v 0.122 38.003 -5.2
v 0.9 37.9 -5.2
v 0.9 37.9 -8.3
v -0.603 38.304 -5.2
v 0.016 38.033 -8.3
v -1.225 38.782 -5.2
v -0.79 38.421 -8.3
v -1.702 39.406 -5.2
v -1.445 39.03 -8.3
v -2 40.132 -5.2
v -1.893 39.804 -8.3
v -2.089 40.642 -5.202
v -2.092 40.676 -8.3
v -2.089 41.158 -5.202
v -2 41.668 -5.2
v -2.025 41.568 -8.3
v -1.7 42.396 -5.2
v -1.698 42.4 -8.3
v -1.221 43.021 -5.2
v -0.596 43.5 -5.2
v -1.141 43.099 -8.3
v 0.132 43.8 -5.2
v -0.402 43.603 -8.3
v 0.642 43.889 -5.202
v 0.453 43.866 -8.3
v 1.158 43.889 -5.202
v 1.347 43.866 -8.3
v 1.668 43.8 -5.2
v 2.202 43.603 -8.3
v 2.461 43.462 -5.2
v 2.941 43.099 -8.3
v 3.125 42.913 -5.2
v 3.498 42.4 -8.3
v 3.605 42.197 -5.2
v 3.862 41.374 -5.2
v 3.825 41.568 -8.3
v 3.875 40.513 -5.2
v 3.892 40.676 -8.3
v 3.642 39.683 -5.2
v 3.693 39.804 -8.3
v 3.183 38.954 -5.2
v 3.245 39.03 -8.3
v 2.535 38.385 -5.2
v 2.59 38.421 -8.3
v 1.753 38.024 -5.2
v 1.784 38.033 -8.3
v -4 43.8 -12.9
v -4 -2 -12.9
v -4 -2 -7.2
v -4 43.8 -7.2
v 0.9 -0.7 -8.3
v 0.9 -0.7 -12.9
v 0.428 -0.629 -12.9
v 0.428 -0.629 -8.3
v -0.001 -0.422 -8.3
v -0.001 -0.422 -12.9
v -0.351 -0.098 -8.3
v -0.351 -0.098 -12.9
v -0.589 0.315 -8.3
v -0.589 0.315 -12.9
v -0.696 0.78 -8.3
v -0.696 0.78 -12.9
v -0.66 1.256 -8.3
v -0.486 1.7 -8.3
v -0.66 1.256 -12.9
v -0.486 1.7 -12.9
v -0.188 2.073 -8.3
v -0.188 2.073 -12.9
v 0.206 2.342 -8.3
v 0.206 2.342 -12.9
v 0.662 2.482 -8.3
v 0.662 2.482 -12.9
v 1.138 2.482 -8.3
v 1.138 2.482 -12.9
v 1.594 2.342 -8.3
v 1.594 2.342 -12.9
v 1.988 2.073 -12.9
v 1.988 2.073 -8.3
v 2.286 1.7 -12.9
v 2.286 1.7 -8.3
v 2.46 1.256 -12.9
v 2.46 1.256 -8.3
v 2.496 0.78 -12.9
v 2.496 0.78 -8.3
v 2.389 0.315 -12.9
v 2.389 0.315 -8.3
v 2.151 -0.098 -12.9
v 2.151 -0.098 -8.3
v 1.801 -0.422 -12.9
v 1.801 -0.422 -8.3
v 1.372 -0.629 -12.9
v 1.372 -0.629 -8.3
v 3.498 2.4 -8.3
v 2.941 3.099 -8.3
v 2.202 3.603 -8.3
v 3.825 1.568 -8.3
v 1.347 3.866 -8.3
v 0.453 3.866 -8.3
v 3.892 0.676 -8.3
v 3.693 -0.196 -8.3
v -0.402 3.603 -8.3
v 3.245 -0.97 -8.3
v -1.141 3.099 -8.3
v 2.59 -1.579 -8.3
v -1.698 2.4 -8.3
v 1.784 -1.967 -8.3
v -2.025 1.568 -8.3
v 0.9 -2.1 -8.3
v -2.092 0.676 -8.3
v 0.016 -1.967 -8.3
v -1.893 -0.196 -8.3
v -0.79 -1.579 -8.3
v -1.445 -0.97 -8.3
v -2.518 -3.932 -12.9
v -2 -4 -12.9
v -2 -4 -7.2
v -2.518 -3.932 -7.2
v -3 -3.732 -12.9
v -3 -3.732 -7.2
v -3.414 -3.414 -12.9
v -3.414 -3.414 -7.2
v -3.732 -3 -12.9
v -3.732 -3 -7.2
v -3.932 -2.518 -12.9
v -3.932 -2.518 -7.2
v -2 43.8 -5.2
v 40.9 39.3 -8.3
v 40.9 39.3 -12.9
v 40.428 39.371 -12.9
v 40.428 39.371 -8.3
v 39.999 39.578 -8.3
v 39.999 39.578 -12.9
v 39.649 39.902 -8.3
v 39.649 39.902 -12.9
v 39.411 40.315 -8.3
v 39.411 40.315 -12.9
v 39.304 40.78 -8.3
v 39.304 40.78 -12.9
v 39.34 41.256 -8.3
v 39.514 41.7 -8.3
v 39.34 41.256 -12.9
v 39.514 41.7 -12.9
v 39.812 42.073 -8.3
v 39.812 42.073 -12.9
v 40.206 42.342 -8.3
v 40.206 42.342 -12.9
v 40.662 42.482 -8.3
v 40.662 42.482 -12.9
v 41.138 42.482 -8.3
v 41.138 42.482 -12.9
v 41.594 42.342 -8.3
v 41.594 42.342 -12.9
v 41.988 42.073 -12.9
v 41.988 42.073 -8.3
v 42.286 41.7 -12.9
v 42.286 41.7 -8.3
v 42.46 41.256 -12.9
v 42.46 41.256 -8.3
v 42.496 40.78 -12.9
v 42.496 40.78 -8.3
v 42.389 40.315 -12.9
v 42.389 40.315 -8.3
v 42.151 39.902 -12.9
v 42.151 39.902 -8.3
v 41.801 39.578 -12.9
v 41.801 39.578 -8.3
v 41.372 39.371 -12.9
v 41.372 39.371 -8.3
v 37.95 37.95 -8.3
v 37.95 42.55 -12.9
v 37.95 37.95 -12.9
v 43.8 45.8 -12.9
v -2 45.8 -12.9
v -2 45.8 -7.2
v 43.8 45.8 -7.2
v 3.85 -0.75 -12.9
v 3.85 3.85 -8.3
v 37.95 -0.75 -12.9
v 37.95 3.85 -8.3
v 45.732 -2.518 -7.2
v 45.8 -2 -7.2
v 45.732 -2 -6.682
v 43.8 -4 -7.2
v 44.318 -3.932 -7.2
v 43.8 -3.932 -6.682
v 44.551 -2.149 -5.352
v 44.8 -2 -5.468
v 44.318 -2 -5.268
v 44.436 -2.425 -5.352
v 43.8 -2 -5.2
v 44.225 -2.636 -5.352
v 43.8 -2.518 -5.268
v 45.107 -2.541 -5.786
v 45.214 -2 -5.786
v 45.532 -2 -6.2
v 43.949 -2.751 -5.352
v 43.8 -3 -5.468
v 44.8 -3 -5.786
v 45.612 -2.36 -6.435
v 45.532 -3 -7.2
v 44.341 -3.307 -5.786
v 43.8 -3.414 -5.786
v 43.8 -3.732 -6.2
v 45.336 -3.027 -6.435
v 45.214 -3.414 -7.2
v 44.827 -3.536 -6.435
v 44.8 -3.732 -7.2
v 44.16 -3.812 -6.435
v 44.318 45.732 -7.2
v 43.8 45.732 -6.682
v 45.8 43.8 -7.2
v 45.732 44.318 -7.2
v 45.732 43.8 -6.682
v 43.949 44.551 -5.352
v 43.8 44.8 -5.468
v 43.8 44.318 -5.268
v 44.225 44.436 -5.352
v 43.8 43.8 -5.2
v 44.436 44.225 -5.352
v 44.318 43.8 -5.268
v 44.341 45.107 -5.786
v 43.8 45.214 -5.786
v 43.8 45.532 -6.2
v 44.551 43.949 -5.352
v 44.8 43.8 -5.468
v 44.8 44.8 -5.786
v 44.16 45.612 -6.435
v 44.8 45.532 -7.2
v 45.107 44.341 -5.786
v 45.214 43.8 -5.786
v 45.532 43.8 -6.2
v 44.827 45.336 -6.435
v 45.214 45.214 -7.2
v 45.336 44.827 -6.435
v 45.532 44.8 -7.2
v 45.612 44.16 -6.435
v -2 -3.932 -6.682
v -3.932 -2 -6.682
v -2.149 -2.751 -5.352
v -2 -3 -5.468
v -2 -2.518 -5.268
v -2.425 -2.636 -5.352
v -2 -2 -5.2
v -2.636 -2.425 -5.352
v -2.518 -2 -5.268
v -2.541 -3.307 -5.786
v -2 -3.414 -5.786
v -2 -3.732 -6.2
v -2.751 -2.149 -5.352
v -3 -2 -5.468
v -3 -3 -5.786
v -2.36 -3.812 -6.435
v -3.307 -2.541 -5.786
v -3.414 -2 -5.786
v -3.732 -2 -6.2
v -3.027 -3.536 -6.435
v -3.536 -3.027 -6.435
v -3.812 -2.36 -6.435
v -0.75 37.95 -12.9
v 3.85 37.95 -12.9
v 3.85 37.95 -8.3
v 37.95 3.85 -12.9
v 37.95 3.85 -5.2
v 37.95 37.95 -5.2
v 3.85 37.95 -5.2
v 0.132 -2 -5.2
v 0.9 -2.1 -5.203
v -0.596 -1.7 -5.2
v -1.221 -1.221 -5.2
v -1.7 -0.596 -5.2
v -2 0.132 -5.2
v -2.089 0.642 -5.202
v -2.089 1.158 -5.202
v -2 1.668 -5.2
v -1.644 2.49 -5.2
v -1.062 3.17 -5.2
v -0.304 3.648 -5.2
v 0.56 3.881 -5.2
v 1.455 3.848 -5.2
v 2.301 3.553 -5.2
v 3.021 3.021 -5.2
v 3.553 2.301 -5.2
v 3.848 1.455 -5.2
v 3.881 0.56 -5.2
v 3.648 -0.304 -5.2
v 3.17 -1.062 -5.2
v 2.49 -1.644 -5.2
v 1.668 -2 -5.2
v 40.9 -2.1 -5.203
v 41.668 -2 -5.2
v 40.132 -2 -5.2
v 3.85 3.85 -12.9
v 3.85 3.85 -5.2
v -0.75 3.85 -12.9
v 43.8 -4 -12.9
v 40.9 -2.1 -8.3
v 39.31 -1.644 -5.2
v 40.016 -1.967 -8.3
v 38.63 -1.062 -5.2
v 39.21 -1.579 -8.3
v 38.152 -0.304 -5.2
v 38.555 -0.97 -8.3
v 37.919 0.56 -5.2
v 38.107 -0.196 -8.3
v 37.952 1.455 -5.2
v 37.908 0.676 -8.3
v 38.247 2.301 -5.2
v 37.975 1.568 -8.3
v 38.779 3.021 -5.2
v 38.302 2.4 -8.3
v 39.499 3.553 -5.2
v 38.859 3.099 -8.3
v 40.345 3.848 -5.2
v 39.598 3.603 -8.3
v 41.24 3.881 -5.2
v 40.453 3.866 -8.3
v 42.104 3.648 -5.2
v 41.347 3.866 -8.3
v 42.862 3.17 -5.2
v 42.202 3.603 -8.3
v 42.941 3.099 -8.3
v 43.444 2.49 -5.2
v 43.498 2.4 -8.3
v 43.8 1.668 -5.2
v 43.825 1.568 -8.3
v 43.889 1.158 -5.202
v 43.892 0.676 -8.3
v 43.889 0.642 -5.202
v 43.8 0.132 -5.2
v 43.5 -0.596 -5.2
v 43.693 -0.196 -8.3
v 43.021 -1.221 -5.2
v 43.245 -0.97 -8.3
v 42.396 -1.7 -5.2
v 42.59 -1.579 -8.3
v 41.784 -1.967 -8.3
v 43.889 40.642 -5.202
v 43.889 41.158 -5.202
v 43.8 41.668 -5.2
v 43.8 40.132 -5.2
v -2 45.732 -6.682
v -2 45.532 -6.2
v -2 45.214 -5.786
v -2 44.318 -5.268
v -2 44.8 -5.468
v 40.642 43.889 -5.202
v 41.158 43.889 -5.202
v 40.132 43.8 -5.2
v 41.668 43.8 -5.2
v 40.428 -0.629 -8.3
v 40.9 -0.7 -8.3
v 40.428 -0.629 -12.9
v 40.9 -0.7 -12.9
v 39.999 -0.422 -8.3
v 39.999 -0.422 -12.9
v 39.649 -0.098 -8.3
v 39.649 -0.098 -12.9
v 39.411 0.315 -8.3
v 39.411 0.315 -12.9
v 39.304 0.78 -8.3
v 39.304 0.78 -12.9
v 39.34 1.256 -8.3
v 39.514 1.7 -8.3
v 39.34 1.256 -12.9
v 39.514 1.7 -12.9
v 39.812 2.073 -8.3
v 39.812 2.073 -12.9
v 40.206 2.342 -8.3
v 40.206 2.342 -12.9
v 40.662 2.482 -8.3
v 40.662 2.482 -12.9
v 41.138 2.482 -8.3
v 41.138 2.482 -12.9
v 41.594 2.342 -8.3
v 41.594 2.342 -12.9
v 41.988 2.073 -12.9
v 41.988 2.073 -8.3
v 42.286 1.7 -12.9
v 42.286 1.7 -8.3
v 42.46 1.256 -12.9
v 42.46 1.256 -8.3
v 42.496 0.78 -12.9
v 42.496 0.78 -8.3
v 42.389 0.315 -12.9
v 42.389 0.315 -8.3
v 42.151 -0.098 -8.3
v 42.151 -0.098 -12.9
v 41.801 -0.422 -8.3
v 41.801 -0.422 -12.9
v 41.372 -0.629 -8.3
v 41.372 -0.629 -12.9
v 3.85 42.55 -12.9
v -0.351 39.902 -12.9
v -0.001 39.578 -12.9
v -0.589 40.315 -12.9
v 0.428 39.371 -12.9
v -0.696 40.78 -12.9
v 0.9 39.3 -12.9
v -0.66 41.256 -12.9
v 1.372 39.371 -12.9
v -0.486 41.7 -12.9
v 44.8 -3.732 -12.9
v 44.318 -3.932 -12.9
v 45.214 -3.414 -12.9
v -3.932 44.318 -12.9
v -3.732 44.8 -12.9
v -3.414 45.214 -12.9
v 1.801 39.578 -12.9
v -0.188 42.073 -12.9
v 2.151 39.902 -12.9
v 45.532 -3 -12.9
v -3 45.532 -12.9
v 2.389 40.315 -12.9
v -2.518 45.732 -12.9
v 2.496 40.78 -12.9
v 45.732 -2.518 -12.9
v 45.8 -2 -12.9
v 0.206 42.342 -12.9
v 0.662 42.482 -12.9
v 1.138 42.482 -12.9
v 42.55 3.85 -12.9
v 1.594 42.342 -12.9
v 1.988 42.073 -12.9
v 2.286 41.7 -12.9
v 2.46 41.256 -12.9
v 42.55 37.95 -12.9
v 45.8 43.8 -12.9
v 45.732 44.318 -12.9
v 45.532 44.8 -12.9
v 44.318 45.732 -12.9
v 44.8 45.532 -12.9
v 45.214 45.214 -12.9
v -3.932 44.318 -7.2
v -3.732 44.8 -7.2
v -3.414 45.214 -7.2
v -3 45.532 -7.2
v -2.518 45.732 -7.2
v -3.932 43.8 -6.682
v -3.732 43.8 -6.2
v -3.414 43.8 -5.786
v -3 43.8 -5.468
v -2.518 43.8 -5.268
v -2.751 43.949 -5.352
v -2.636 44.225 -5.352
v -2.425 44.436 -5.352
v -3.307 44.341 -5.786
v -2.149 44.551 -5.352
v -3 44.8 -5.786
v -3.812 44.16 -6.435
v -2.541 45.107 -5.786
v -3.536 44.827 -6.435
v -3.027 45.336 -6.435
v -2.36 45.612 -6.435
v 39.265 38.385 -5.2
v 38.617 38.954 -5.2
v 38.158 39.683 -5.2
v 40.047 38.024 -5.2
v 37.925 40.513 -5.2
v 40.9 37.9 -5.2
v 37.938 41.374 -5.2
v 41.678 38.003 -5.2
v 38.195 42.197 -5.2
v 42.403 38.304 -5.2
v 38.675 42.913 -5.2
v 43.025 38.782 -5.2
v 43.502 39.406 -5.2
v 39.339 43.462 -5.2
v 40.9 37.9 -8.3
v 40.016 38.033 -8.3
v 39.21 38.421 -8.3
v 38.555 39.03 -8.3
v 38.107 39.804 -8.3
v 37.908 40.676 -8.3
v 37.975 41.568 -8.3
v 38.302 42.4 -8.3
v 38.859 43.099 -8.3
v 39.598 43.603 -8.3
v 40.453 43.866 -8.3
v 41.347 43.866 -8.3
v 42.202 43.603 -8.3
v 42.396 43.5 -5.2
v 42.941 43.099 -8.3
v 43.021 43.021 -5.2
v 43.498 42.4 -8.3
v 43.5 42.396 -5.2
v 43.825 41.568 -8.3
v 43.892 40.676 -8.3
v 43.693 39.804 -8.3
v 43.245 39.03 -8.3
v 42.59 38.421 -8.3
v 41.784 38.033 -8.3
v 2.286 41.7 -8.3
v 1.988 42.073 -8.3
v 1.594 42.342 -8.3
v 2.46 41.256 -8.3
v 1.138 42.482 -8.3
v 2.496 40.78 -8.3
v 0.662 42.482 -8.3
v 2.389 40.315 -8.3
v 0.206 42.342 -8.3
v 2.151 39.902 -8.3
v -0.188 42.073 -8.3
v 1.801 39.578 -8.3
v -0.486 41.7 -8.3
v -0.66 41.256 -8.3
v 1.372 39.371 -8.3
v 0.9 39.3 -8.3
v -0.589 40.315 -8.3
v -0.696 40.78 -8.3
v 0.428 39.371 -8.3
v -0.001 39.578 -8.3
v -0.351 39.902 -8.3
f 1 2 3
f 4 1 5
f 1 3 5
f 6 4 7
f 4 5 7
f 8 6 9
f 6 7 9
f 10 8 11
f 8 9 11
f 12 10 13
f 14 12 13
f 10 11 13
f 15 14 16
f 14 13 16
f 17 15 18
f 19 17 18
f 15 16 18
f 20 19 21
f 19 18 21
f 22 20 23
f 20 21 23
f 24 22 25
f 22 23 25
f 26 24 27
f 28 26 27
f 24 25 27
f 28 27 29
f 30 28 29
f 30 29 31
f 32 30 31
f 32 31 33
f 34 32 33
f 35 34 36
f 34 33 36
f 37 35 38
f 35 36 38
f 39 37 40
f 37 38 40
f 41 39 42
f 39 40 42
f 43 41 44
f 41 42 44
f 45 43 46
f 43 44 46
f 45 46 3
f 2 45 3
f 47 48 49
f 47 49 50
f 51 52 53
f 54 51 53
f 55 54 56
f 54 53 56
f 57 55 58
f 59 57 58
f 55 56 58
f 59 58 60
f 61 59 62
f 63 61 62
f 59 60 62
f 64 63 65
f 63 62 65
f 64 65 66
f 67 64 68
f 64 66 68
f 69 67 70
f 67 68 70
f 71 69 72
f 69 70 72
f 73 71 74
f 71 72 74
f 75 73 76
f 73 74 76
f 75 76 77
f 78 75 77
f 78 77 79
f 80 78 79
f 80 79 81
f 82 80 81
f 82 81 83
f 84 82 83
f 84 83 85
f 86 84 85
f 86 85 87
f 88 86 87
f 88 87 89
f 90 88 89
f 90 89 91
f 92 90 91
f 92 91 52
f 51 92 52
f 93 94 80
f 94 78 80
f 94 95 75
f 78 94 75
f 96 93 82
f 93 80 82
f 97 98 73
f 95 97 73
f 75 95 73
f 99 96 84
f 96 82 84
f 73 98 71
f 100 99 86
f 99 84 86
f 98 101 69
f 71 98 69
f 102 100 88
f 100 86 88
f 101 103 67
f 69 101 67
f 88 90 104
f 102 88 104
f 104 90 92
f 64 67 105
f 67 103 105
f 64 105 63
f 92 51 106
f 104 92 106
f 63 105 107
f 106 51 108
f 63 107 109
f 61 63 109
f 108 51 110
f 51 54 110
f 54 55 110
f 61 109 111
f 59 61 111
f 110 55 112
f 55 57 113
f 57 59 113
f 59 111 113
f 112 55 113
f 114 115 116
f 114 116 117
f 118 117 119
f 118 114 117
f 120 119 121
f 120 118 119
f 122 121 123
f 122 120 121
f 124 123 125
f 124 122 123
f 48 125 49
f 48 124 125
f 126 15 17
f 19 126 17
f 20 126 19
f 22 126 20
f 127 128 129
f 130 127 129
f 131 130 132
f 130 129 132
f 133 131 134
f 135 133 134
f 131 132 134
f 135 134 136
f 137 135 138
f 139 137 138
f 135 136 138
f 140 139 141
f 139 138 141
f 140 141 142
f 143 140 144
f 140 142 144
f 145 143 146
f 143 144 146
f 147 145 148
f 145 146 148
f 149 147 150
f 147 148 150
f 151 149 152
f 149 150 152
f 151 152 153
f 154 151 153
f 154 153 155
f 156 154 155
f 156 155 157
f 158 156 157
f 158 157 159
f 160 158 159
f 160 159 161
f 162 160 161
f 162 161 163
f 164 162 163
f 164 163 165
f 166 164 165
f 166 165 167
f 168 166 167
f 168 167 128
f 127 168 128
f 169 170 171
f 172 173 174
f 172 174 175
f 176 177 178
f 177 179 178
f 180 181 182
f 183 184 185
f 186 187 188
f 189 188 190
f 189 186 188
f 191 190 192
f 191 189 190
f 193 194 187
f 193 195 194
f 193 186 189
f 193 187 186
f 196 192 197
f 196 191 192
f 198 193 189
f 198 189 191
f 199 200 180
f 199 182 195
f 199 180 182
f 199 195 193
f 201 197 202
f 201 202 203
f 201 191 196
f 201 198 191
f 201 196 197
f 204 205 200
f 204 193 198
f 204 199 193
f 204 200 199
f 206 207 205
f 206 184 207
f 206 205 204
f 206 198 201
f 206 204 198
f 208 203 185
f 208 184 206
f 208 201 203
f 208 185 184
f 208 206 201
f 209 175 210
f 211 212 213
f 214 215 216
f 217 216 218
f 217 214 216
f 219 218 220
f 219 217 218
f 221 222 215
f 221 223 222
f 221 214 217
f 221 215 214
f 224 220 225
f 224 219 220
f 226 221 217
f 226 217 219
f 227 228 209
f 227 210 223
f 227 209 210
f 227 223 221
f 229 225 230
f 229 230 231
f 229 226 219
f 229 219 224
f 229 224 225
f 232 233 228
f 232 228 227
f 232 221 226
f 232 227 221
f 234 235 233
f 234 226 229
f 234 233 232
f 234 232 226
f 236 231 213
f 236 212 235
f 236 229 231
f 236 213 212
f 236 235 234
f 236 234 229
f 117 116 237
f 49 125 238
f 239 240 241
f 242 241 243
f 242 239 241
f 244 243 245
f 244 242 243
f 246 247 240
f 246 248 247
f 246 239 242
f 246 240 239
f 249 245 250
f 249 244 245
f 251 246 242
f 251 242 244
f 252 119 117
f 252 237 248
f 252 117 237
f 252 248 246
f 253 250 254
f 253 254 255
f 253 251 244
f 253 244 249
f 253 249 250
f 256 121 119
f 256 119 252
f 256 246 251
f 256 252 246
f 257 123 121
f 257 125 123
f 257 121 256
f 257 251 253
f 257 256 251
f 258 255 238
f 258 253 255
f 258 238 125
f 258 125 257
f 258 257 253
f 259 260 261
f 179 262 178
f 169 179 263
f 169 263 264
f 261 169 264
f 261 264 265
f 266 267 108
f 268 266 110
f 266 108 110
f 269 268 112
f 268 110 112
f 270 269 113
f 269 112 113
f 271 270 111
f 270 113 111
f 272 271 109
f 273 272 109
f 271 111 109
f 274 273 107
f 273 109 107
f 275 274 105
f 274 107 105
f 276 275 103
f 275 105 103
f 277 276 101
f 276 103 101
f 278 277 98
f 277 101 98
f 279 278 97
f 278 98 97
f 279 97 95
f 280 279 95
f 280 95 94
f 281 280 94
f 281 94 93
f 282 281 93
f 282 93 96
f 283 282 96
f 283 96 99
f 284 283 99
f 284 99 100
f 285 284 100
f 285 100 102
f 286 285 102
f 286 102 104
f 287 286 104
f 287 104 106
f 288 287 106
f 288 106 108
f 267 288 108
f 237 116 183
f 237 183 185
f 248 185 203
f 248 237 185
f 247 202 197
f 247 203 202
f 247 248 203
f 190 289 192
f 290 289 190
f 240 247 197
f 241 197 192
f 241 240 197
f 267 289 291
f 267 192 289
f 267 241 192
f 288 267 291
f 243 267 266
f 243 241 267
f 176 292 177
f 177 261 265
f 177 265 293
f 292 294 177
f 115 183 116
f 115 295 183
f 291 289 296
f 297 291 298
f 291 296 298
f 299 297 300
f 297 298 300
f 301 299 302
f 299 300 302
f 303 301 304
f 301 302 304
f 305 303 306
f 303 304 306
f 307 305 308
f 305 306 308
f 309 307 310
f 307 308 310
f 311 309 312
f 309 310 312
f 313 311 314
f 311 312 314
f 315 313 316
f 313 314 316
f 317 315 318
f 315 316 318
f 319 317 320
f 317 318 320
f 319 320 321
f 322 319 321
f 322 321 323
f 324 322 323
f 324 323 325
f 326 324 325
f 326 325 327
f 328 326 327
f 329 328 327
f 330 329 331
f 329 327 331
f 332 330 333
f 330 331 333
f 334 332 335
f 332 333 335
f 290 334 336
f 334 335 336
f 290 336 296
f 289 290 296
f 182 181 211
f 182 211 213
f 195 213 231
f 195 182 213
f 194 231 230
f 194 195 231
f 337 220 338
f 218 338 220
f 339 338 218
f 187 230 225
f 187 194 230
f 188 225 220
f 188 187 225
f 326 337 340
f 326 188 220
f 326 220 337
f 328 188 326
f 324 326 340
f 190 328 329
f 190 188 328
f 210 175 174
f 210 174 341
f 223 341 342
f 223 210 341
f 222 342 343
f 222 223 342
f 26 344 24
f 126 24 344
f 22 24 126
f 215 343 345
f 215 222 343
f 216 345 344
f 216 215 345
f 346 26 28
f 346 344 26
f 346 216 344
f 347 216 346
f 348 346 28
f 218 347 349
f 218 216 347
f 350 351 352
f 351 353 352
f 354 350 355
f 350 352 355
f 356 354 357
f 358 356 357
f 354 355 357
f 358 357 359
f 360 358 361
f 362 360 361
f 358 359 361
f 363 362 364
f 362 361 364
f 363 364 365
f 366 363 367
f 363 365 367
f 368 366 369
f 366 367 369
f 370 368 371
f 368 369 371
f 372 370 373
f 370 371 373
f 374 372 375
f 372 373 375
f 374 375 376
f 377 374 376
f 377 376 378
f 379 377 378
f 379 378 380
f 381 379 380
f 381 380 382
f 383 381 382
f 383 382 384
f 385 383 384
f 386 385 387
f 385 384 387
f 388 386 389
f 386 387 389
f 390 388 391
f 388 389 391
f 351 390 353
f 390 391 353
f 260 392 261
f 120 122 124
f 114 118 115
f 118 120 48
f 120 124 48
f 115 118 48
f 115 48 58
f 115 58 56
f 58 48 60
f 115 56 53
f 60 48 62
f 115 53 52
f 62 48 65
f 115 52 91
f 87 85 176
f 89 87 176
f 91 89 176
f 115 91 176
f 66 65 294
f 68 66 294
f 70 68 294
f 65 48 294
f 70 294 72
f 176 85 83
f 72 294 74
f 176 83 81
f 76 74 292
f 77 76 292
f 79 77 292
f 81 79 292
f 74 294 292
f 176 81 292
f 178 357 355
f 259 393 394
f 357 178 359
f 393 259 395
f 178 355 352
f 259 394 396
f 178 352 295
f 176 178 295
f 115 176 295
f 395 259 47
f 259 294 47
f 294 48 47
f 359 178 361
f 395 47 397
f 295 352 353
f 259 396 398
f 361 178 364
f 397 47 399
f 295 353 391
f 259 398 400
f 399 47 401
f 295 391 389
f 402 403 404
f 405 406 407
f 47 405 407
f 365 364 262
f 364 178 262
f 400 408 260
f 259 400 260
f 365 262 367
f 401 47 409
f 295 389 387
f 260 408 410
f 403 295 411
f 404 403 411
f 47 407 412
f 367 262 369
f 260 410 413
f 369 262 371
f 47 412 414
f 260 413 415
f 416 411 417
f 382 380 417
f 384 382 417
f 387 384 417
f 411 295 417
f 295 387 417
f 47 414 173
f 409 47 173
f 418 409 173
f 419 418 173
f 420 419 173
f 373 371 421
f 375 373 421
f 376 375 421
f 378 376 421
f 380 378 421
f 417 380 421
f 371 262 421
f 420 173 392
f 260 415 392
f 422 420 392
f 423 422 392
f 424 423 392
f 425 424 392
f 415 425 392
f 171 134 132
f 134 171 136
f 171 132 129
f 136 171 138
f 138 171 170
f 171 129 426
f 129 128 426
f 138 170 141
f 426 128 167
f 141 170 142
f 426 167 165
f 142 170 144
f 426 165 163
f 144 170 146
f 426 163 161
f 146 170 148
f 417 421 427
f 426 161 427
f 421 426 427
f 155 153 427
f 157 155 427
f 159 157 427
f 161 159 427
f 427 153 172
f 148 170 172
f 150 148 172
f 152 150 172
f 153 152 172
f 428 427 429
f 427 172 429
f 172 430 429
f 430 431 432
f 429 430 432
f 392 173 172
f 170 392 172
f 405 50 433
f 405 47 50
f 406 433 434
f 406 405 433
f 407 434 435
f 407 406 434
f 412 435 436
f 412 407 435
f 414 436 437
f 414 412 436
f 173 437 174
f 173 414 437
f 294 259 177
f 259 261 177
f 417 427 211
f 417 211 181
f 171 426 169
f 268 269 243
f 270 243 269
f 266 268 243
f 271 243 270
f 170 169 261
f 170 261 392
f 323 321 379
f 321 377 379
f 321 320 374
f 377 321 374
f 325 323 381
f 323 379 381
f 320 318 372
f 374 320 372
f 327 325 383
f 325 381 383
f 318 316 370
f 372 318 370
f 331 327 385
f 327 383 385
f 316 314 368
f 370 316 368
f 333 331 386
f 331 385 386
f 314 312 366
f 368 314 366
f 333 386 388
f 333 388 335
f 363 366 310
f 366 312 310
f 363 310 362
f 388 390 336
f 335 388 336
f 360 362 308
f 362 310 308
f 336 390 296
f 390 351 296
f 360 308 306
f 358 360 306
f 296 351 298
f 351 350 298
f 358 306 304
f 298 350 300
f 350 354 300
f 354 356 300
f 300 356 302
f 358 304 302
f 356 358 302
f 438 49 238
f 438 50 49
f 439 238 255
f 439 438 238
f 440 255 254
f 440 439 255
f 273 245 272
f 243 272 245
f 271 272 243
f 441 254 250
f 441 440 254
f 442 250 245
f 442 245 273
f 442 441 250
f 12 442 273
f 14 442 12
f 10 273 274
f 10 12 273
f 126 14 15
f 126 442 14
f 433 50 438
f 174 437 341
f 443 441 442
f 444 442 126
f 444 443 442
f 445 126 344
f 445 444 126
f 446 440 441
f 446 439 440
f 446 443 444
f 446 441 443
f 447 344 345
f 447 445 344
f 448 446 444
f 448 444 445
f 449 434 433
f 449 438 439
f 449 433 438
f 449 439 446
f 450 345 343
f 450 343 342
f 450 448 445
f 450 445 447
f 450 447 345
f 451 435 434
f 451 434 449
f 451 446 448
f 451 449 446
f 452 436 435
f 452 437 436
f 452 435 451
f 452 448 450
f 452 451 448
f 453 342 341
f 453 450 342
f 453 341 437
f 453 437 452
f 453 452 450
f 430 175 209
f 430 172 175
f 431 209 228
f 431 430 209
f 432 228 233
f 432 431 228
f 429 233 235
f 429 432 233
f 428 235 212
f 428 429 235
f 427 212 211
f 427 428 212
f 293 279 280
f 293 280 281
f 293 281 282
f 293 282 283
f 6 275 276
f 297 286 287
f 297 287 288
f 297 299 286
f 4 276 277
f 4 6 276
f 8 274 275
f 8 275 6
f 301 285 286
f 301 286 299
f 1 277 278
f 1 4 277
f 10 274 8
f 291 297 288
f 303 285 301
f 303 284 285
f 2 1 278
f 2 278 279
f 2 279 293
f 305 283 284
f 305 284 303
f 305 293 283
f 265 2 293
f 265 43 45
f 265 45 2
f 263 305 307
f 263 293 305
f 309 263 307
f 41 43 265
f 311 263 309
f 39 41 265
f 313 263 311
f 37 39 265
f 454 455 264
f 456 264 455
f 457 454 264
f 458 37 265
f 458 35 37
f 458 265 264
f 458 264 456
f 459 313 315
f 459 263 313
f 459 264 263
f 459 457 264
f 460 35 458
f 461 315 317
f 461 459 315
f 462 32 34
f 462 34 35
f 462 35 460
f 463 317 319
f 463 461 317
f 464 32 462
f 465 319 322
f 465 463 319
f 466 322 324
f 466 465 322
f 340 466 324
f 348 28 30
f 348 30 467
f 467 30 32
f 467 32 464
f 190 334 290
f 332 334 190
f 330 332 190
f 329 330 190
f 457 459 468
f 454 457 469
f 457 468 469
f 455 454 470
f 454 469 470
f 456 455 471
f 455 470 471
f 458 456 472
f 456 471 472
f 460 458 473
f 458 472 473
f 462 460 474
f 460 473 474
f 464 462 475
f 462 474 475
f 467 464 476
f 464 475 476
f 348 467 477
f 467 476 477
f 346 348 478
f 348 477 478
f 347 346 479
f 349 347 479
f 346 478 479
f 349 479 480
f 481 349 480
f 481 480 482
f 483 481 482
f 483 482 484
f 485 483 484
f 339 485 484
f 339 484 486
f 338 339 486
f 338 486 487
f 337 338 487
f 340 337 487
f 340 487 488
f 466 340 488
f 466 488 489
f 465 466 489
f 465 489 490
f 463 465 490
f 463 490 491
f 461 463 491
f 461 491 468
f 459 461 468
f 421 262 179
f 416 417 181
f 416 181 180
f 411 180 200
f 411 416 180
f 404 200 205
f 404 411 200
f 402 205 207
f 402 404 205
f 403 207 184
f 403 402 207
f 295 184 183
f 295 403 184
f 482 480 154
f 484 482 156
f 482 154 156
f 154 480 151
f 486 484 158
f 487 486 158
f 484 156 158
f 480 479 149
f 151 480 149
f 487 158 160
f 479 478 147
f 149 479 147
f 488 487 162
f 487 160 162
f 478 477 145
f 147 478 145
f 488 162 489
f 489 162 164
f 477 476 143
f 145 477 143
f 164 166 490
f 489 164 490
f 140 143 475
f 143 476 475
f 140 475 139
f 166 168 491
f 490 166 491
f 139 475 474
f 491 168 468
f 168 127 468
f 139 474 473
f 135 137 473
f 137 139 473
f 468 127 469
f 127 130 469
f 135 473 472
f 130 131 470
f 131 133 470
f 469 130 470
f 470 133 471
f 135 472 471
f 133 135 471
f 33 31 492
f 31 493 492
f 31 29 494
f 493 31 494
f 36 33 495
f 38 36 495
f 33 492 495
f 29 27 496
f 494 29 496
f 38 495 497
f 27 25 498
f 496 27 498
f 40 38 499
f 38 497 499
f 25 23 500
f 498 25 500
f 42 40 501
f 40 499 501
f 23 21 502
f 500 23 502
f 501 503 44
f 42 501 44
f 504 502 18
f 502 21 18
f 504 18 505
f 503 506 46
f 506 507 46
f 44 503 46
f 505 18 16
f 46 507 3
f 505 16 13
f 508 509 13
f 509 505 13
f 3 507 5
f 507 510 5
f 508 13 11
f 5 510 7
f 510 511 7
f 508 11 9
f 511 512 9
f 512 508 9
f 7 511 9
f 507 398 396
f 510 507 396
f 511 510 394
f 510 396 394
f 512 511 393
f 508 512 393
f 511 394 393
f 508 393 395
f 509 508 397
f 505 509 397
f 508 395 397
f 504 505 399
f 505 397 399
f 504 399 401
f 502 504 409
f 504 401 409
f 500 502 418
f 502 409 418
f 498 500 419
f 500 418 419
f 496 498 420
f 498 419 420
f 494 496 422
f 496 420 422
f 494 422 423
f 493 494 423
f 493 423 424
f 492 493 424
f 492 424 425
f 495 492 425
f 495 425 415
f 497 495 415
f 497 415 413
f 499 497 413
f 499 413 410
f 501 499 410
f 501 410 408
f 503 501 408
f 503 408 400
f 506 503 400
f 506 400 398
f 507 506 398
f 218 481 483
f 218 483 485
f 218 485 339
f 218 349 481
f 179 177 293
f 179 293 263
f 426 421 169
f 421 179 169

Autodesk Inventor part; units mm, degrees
ref_plane "YZ Plane" through (0, 0, 0) normal (1, 0, 0) x (0, 1, 0)
ref_plane "XZ Plane" through (0, 0, 0) normal (0, 1, 0) x (-1, 0, 0)
ref_plane "Work Plane1" through (0, 41.8, -12.9) normal (0, 0, 1) x (1, 0, 0)
sketch "Sketch1" plane through (0, 41.8, -12.9) normal (0, 0, 1) x (1, 0, 0)
  line L0 (3.85, 0.3752) -> (3.85, 4) construction
  line L1 (3.85, 4) -> (-2, 4) construction
  arc A0 (-2, 4) -> (-4, 2) centre (-2, 2) ccw construction
  line L2 (-4, 2) -> (-4, -3.85) construction
  line L3 (-4, -3.85) -> (-0.3752, -3.85) construction
  line L4 (-2, 4) -> (43.8, 4)
  line L5 (45.8, 2) -> (45.8, -43.8)
  line L6 (43.8, -45.8) -> (-2, -45.8)
  line L7 (-4, -43.8) -> (-4, 2)
  line L8 (40.3, -37.8) -> (40.3, -4)
  line L9 (37.8, -1.5) -> (4, -1.5)
  line L10 (1.5, -4) -> (1.5, -37.8)
  line L11 (4, -40.3) -> (37.8, -40.3)
  line L12 (37.8, -40.3) -> (40.3, -37.8)
  line L13 (4, -40.3) -> (1.5, -37.8)
  line L14 (4, -1.5) -> (1.5, -4)
  line L15 (40.3, -4) -> (37.8, -1.5)
  arc A1 (45.8, 2) -> (43.8, 4) centre (43.8, 2) ccw
  arc A2 (43.8, -45.8) -> (45.8, -43.8) centre (43.8, -43.8) ccw
  arc A3 (-4, -43.8) -> (-2, -45.8) centre (-2, -43.8) ccw
  arc A4 (-2, 4) -> (-4, 2) centre (-2, 2) ccw
  circle A5 centre (1, -1) radius 1.4
  circle A6 centre (40.8, -1) radius 1.4
  circle A7 centre (40.8, -40.8) radius 1.4
  circle A8 centre (1, -40.8) radius 1.4
  circle A9 centre (20.9, -20.9) radius 19.4 construction
  line L16 (3.85, -3.85) -> (3.85, -37.95)
  line L17 (3.85, -37.95) -> (37.95, -37.95)
  line L18 (37.95, -37.95) -> (37.95, -3.85)
  line L19 (37.95, -3.85) -> (3.85, -3.85)
  arc A10 (2.2654, -1.2094) -> (1.2094, -2.2654) centre (0.9, -0.9) ccw projected
  line L20 (2.2654, -1.2094) -> (3.85, 0.3752) projected
  line L21 (-0.3752, -3.85) -> (1.2094, -2.2654) projected
  point P0 (45.8, -45.8)
  point P1 (45.8, 4)
  point P2 (-4, -45.8)
  point P3 (40.3, -40.3)
  point P4 (40.3, -1.5)
  point P5 (1.5, -1.5)
  point P6 (1.5, -40.3)
  point P7 (40.8, -1)
  dimension "d55" = 2.8
  dimension "d34" = 49.8
  dimension "d35" = 49.8
  dimension "d36" = 5.5
  dimension "d37" = 2.5
  dimension "d38" = 2.5
  dimension "d39" = 2.5
  dimension "d40" = 2.5
  dimension "d41" = 2.5
  dimension "d42" = 2.5
  dimension "d43" = 2.5
  dimension "d44" = 2.5
  dimension "d45" = 2
  dimension "d46" = 5
  dimension "d47" = 5
  dimension "d48" = 5
  dimension "d49" = 5
  dimension "d51" = 5
  dimension "d52" = 0.5
  dimension "d53" = 5
  dimension "d54" = 5
  dimension "d56" = 2.8
  dimension "d57" = 2.8
  dimension "d58" = 2.8
  dimension "d90" = 7.85
extrude "Extrusion1" add sketch "Sketch1" along normal blind 7.7 contours L4 A1 L5 A2 L6 A3 L7 A4 | L12 L11 L13 L10 L14 L9 L15 L8 | A5 A10
fillet "Fillet1" radius 2 8 edges at (20.9, -4, -5.2) (45.2142, -3.4142, -5.2) (45.8, 20.9, -5.2) (45.2142, 45.2142, -5.2) (20.9, 45.8, -5.2) (-3.4142, 45.2142, -5.2) (-4, 20.9, -5.2) (-3.4142, -3.4142, -5.2)
sketch "Sketch3" plane through (0, 41.8, -5.2) normal (0, 0, 1) x (1, 0, 0)
  circle A0 centre (20.9, -20.9) radius 16.9 construction
  point P0 (0, -41.8)
sketch "Sketch4" plane through (0, 41.8, -5.2) normal (0, 0, 1) x (1, 0, 0)
  line L0 (37.95, -37.95) -> (37.95, -3.85) projected
  line L1 (37.95, -3.85) -> (3.85, -3.85) projected
  line L2 (3.85, -3.85) -> (3.85, -37.95) projected
  line L3 (3.85, -37.95) -> (37.95, -37.95) projected
  circle A0 centre (40.9, -0.9) radius 2.75 projected
  circle A1 centre (0.9, -40.9) radius 2.75 projected
  circle A2 centre (0.9, -0.9) radius 2.75 projected
  circle A3 centre (40.9, -40.9) radius 2.75 projected
  line L4 (34.3452, 2) -> (7.4548, 2) projected
  line L5 (43.8, -34.3452) -> (43.8, -7.4548) projected
  line L6 (7.4548, -43.8) -> (34.3452, -43.8) projected
  line L7 (-2, -7.4548) -> (-2, -34.3452) projected
  arc A4 (34.3452, 2) -> (36.4548, 2) centre (35.4, -0.1) ccw projected
  line L8 (43.8, 2) -> (36.4548, 2) projected
  line L9 (43.8, -5.3452) -> (43.8, 2) projected
  arc A5 (43.8, -5.3452) -> (43.8, -7.4548) centre (41.7, -6.4) ccw projected
  arc A6 (43.8, -34.3452) -> (43.8, -36.4548) centre (41.7, -35.4) ccw projected
  line L10 (43.8, -43.8) -> (43.8, -36.4548) projected
  line L11 (36.4548, -43.8) -> (43.8, -43.8) projected
  arc A7 (36.4548, -43.8) -> (34.3452, -43.8) centre (35.4, -41.7) ccw projected
  arc A8 (7.4548, -43.8) -> (5.3452, -43.8) centre (6.4, -41.7) ccw projected
  line L12 (-2, -43.8) -> (5.3452, -43.8) projected
  line L13 (-2, -36.4548) -> (-2, -43.8) projected
  arc A9 (-2, -36.4548) -> (-2, -34.3452) centre (0.1, -35.4) ccw projected
  arc A10 (-2, -7.4548) -> (-2, -5.3452) centre (0.1, -6.4) ccw projected
  line L14 (-2, 2) -> (-2, -5.3452) projected
  line L15 (5.3452, 2) -> (-2, 2) projected
  arc A11 (5.3452, 2) -> (7.4548, 2) centre (6.4, -0.1) ccw projected
hole "Hole2" at (40.9, 40.9, -5.2) at (40.9, 0.9, -5.2) at (0.9, 0.9, -5.2) at (0.9, 40.9, -5.2) direction (0, 0, -1) diameter 3.2 depth 12 tip angle 118 counterbore diameter 6 counterbore depth 3.1
chamfer "Chamfer2" distance 4.6 angle 45 2 edges at (3.85, 20.9, -12.9) (37.95, 20.9, -12.9)
sketch "Sketch9" plane through (37.95, 3.85, -5.2) normal (-1, 0, 0) x (0, 0, 1)
  line L0 (-7.7, 0) -> (-3.1, 0) projected
  line L1 (-3.1, 34.1) -> (-7.7, 34.1) projected
  line L2 (-3.1, 0) -> (-7.7, -4.6)
  line L3 (-7.7, 39.95) -> (-7.7, -5.85) projected
  line L4 (-3.1, 0) -> (3.4054, 0) construction
  line L5 (-7.7, -4.6) -> (-7.7, 0)
  line L6 (-3.1, 34.1) -> (-7.7, 38.7)
  line L7 (-3.1, 34.1) -> (3.4054, 34.1) construction
  line L8 (-7.7, 38.7) -> (-7.7, 34.1)
  line L9 (-7.7, 34.1) -> (-3.1, 34.1)
  point P0 (5.2, -3.85)
  point P1 (-7.7, -5.85)
  dimension "d91" = 135
  dimension "d92" = 135
extrude "Extrusion3" cut sketch "Sketch9" along normal up to surface (34.1 mm away)
sketch "Sketch14" plane through (0, 41.8, -5.2) normal (0, 0, 1) x (1, 0, 0)
  arc A0 (1.6681, -43.8) -> (-2, -40.1319) centre (0.9, -40.9) ccw construction
  line L0 (40.1319, -43.8) -> (1.6681, -43.8) construction
  arc A1 (43.8, -40.1319) -> (40.1319, -43.8) centre (40.9, -40.9) ccw construction
  line L1 (43.8, -1.6681) -> (43.8, -40.1319) construction
  arc A2 (40.1319, 2) -> (43.8, -1.6681) centre (40.9, -0.9) ccw construction
  line L2 (1.6681, 2) -> (40.1319, 2) construction
  arc A3 (-2, -1.6681) -> (1.6681, 2) centre (0.9, -0.9) ccw construction
  line L3 (-2, -40.1319) -> (-2, -1.6681) construction
  line L4 (3.85, -3.85) -> (37.95, -3.85) construction
  line L5 (37.95, -3.85) -> (37.95, -37.95) construction
  line L6 (37.95, -37.95) -> (3.85, -37.95) construction
  line L7 (3.85, -37.95) -> (3.85, -3.85) construction
  point P0 (0, -41.8)
  point P1 (6.4, -0.1)
  point P2 (0.1, -6.4)
  point P3 (0.1, -35.4)
  point P4 (6.4, -41.7)
  point P5 (35.4, -41.7)
  point P6 (41.7, -35.4)
  point P7 (41.7, -6.4)
  point P8 (35.4, -0.1)
hole "Hole6" [suppressed]
ref_plane "Work Plane5" through (20.9, -2, -12.9) normal (-1, 0, 0) x (0, 0, 1)
ref_plane "Work Plane6" through (-2, 20.9, -12.9) normal (0, -1, 0) x (1, 0, 0)
equation "\"d38\" = d37"
equation "\"d39\" = d37"
equation "\"d40\" = d39"
equation "\"d41\" = d37"
equation "\"d42\" = d41"
equation "\"d43\" = d37"
equation "\"d44\" = d43"
properties part number "10_Lid_1x1_v3"
